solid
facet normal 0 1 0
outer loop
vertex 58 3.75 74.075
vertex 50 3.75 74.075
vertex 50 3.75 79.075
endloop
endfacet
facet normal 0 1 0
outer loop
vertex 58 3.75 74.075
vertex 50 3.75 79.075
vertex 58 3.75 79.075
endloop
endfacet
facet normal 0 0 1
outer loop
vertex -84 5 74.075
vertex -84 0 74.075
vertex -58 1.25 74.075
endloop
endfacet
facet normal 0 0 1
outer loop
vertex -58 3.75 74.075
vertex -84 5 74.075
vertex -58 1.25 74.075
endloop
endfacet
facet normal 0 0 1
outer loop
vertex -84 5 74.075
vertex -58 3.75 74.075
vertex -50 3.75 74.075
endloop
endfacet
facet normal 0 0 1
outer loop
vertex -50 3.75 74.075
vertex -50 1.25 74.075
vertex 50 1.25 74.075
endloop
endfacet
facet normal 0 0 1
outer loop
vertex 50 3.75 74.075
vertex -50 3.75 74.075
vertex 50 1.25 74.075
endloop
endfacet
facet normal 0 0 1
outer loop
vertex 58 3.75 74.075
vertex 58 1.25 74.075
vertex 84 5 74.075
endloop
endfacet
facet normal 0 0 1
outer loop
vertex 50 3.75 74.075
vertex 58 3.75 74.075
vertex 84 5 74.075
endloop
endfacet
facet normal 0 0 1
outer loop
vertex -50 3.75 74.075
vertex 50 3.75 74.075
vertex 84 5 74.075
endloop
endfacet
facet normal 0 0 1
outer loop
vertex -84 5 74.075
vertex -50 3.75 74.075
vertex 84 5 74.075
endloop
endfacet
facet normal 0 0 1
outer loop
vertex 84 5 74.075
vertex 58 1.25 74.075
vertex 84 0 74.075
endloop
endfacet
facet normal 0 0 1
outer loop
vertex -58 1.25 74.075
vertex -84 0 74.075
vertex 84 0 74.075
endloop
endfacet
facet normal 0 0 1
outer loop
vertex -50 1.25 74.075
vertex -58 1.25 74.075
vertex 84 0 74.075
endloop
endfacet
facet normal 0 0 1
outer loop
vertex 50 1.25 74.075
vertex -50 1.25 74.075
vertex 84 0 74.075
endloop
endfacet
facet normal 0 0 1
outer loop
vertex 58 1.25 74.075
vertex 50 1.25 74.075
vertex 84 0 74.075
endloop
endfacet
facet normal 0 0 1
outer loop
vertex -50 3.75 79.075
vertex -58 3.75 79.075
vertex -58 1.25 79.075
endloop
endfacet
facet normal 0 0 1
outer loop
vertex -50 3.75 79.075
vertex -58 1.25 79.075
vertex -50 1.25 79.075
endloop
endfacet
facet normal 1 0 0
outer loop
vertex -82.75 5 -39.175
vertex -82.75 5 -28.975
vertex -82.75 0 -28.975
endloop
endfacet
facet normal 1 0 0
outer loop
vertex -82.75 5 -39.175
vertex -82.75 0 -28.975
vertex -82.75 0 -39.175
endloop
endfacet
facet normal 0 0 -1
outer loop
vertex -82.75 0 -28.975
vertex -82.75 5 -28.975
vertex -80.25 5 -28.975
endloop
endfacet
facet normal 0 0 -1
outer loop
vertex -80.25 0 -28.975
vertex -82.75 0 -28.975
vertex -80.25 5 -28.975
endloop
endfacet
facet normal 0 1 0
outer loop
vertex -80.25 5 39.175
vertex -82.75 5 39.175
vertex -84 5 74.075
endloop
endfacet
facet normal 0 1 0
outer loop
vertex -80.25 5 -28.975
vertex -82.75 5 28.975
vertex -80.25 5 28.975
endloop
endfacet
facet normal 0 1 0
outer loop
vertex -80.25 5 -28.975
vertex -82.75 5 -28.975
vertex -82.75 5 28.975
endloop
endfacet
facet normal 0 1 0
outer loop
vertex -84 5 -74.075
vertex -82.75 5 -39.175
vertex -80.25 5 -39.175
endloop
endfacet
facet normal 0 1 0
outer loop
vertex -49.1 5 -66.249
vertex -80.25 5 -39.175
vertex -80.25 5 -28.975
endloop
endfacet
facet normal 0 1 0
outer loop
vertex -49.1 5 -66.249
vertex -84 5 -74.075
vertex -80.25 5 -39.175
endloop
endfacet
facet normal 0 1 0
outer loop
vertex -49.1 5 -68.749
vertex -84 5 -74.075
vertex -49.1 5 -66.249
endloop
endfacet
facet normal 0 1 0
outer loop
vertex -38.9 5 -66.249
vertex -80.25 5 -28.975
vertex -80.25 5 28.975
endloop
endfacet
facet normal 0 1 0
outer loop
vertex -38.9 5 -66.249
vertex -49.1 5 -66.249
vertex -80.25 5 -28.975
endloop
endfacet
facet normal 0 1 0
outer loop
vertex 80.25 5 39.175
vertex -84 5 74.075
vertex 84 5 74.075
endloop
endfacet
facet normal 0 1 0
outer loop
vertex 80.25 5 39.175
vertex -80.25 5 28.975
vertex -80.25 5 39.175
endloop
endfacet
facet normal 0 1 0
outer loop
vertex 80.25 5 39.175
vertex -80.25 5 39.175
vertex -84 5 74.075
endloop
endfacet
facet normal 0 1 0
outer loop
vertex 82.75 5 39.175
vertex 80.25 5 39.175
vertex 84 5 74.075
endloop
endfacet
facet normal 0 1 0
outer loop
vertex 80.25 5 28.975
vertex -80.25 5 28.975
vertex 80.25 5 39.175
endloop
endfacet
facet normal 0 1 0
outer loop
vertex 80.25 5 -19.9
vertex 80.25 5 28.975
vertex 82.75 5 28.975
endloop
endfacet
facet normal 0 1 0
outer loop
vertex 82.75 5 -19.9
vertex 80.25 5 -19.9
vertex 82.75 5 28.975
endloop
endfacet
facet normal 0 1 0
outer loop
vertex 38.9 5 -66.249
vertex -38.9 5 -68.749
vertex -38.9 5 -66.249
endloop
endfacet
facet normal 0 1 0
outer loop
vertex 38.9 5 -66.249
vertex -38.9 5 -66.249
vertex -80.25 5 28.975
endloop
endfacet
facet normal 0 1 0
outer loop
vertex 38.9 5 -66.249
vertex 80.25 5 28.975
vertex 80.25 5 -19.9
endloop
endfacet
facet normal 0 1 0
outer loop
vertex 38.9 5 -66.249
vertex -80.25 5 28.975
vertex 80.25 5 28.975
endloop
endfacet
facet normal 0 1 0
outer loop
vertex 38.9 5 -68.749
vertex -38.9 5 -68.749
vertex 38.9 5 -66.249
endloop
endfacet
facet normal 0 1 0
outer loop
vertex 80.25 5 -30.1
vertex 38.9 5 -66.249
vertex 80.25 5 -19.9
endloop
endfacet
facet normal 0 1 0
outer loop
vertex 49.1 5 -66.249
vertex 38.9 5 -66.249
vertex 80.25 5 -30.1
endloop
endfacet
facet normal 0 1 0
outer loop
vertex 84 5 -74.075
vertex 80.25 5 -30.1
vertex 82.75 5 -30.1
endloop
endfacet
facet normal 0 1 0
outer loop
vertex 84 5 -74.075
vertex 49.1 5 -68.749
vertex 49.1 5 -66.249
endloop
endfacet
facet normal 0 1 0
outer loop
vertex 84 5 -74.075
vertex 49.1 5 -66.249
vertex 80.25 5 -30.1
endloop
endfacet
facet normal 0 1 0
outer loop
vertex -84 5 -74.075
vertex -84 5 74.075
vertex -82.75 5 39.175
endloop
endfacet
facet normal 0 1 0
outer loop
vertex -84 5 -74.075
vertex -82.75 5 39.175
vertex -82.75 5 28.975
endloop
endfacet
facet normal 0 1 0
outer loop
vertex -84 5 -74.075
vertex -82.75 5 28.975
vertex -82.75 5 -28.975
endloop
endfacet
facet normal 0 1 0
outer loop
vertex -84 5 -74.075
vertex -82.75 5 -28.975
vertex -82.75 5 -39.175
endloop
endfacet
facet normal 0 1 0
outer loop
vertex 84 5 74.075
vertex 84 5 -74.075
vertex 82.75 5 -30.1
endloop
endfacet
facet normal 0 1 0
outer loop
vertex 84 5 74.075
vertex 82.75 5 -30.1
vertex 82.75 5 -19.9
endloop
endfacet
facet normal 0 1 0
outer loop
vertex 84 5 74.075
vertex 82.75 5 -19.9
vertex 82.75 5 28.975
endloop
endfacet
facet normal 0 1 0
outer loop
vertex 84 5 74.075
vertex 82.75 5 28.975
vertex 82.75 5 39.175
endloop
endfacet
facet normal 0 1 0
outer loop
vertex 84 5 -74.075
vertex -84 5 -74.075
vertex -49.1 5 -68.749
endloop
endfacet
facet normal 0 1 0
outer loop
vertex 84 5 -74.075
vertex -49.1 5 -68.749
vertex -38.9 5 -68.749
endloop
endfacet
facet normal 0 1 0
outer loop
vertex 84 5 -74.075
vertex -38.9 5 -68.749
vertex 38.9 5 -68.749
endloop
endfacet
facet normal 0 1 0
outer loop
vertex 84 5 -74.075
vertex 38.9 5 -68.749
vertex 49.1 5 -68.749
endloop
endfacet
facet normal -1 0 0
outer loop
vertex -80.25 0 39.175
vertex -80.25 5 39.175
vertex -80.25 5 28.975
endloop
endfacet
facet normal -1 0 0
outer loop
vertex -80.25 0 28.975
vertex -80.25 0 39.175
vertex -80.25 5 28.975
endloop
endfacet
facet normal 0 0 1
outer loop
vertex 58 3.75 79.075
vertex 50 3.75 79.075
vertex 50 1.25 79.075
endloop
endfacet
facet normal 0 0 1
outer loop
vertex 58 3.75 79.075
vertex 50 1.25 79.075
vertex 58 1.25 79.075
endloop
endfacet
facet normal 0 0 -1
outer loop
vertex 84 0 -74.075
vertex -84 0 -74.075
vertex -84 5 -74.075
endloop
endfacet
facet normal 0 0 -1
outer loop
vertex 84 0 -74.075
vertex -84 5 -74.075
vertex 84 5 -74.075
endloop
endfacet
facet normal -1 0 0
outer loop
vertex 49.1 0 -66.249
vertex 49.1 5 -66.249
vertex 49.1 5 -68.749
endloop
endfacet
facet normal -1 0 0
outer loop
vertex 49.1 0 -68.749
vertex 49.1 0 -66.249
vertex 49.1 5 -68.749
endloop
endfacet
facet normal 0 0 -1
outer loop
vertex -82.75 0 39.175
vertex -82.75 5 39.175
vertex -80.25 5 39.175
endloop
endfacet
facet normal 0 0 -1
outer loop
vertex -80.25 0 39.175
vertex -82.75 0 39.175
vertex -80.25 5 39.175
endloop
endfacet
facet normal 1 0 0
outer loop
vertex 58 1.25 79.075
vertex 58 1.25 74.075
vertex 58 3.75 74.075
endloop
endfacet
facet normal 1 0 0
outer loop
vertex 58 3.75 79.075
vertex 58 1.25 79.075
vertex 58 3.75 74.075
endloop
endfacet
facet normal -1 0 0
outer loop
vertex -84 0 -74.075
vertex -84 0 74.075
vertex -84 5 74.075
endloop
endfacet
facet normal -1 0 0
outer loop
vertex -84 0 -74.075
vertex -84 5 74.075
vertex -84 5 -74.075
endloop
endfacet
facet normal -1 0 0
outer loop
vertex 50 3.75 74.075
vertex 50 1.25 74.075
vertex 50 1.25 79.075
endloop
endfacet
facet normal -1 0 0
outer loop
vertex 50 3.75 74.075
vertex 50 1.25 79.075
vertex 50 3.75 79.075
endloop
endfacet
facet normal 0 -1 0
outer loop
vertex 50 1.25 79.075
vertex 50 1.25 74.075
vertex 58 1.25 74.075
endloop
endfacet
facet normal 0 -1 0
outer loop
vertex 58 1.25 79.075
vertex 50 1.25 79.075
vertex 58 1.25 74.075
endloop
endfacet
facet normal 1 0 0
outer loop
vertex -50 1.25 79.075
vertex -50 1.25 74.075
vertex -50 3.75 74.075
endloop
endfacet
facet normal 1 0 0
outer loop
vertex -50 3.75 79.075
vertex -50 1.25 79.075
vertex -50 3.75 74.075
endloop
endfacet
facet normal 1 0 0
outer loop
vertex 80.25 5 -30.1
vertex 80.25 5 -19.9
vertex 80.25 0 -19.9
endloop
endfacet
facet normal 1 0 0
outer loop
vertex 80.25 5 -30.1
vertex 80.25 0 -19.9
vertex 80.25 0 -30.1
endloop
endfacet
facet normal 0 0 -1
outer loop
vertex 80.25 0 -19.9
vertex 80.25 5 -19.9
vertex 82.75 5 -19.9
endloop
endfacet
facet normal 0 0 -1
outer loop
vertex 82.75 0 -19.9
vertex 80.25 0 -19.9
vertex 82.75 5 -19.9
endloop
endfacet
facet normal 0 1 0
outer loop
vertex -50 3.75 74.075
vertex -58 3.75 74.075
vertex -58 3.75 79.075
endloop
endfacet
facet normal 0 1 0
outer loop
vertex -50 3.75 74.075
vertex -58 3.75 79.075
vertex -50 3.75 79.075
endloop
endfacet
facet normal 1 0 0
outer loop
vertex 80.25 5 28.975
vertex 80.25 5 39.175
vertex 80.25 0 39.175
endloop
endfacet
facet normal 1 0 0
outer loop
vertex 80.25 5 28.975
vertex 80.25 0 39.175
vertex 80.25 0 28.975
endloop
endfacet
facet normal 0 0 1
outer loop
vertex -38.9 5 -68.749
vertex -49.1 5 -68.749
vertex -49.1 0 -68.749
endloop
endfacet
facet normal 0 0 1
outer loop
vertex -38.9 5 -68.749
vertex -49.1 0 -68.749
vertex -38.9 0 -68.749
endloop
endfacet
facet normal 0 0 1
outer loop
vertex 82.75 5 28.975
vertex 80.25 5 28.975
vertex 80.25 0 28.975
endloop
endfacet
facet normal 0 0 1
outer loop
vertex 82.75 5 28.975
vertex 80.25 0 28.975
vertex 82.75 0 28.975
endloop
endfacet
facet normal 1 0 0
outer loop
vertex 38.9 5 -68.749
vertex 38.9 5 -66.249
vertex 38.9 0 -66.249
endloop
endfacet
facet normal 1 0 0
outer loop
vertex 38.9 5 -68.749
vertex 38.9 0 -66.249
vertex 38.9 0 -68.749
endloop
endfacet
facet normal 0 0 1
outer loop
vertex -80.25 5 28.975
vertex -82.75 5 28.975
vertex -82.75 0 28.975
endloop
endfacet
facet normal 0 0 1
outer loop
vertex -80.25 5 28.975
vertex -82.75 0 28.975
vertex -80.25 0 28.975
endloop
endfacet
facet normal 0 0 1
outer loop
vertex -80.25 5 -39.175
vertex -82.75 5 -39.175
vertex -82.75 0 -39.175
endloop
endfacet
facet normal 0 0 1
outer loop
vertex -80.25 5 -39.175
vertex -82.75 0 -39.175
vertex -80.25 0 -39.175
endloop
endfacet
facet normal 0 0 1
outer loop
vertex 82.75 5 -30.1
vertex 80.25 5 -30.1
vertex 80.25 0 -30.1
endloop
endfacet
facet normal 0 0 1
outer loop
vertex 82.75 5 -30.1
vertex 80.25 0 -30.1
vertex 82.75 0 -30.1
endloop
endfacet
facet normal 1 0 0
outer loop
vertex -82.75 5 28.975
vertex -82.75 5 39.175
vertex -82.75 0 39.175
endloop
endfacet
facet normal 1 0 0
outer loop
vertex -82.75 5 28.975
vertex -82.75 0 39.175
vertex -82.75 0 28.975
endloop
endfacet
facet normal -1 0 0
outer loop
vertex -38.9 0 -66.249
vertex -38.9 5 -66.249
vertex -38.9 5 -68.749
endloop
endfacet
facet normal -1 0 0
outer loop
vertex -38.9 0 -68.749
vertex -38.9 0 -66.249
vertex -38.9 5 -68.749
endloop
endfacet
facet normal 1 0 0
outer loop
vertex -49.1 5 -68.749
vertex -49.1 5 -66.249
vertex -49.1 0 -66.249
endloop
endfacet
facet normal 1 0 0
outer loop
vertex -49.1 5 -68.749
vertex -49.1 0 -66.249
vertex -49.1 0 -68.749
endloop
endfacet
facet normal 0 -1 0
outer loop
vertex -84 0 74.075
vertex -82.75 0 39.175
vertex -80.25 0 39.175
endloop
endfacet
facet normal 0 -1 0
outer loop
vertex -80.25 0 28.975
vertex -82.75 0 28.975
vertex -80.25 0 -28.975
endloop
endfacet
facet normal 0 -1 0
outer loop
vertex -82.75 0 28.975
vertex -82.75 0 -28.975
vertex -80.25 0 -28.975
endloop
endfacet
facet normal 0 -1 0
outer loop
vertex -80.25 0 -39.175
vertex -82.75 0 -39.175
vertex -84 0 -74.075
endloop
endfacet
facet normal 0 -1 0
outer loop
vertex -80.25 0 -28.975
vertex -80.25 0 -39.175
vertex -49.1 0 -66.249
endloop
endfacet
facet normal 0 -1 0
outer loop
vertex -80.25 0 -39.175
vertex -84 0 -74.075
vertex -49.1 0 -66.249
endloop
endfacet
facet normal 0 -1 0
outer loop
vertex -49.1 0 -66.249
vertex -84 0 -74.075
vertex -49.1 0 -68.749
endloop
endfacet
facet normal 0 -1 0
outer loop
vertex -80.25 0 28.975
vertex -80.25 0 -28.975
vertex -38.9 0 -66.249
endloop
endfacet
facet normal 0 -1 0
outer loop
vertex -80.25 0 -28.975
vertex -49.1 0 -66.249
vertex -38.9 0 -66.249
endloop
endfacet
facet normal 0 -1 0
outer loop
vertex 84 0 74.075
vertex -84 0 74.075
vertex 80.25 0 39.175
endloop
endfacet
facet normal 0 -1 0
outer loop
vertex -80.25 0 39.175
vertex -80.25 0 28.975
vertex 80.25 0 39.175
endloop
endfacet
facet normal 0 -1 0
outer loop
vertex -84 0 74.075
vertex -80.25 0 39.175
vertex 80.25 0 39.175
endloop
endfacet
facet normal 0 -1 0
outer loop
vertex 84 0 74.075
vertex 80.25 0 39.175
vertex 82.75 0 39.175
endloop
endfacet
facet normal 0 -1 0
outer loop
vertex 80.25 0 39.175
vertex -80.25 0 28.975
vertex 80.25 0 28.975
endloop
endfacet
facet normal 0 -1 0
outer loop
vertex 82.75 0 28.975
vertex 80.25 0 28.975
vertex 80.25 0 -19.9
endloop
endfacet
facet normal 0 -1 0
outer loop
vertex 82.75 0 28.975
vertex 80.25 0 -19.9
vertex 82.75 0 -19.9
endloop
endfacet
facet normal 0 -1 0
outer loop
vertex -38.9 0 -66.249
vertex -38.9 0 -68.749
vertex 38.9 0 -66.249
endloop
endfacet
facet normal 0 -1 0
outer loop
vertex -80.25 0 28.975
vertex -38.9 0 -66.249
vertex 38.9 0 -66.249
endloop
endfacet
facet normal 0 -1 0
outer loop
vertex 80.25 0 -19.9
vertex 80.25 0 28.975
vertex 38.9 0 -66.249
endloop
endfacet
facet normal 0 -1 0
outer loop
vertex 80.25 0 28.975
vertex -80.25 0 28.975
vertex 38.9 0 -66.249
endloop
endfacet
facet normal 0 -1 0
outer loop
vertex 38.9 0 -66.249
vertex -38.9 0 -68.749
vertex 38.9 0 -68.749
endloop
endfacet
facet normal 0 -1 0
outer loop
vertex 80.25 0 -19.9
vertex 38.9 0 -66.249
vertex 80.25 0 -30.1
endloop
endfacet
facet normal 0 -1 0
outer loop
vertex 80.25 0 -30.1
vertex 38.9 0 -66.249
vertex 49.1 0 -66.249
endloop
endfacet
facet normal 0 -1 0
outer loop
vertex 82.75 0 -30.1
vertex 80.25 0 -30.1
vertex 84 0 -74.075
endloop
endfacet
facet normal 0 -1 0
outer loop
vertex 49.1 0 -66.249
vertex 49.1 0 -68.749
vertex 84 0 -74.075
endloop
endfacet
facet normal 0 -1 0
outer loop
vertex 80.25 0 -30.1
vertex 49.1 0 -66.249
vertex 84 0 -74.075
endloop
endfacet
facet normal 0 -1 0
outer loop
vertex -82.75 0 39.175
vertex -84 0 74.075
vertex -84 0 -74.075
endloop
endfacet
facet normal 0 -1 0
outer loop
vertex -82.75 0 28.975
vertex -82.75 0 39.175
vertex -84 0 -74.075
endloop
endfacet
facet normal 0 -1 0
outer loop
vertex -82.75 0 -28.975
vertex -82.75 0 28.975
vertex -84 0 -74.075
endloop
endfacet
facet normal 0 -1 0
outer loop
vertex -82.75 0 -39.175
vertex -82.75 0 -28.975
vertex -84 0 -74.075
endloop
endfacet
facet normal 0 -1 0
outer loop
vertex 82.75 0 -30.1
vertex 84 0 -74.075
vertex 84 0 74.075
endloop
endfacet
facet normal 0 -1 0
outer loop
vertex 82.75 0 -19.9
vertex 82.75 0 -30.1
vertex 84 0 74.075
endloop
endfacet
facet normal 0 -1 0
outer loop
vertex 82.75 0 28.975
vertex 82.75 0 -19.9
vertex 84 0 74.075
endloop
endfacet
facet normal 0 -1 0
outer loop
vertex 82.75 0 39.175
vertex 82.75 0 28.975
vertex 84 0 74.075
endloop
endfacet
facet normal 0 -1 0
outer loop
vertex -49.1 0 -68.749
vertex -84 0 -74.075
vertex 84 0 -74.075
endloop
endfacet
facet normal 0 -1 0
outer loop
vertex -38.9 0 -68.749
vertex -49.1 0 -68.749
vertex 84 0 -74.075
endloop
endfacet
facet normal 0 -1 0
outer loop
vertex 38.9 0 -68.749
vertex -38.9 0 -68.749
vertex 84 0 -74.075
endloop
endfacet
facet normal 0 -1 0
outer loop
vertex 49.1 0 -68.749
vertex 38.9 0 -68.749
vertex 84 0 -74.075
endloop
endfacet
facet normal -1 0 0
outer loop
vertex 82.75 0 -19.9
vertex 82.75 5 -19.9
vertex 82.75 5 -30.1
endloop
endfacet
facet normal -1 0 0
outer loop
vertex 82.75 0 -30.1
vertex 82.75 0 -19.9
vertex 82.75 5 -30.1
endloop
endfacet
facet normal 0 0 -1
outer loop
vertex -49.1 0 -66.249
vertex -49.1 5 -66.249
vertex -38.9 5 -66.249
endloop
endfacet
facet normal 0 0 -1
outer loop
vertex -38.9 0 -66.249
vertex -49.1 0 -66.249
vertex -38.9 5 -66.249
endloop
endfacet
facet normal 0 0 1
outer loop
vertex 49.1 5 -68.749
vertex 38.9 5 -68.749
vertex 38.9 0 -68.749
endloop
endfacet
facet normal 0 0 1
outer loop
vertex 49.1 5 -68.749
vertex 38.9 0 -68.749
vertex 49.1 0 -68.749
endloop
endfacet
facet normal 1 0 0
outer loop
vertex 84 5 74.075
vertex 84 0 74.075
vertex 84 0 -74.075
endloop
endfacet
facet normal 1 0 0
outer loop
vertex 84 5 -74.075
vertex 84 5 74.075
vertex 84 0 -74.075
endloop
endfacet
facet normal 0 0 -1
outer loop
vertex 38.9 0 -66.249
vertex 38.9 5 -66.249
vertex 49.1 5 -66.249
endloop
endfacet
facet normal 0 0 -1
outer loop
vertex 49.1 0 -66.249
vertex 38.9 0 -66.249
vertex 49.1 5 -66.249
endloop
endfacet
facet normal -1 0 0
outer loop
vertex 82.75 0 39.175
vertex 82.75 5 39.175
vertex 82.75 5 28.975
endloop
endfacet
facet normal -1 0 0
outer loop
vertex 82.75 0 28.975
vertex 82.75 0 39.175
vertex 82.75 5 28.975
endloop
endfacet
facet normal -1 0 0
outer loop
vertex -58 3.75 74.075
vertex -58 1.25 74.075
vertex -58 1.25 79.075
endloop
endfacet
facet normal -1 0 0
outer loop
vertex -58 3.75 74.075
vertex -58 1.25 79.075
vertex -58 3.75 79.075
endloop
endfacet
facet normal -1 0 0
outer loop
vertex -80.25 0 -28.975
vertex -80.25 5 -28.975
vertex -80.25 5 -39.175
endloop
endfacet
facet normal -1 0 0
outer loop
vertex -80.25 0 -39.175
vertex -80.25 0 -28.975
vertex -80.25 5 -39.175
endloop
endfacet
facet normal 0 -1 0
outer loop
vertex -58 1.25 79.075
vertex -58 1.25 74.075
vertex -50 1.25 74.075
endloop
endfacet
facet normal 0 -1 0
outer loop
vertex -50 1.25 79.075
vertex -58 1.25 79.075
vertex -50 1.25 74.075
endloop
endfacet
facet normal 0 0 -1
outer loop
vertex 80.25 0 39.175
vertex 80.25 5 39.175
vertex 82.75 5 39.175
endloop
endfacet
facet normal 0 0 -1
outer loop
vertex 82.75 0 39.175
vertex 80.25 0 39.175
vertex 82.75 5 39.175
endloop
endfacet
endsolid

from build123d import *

# Parameters (mm, degrees)
CROQUIS1_W              = 168
CROQUIS1_H              = 148.15
SALIENTE_EXTRUIR1_DEPTH = 5
CROQUIS2_W              = 2.5
CROQUIS2_H              = 10.2
CORTAR_EXTRUIR1_DEPTH   = 5
CROQUIS4_W              = 8
CROQUIS4_H              = 2.5
SALIENTE_EXTRUIR2_DEPTH = 5
SKETCH1_W               = 10.2
SKETCH1_H               = 2.5
CUT_EXTRUDE2_DEPTH      = 5


with BuildPart() as part:
    # Croquis1 → Saliente-Extruir1 (new body)
    with BuildSketch(Plane(origin=(0, 0, 0), x_dir=(1, 0, 0), z_dir=(0, 1, 0))):
        Rectangle(CROQUIS1_W, CROQUIS1_H)
    extrude(amount=SALIENTE_EXTRUIR1_DEPTH)

    # Croquis2 → Cortar-Extruir1 (cut)
    with BuildSketch(Plane(origin=(0, 5, 0), x_dir=(1, 0, 0), z_dir=(0, 1, 0))):
        with Locations((-81.5, 34.075)):
            Rectangle(CROQUIS2_W, CROQUIS2_H)
        with Locations((-81.5, -34.075)):
            Rectangle(CROQUIS2_W, CROQUIS2_H)
        with Locations((81.5, -34.075)):
            Rectangle(CROQUIS2_W, CROQUIS2_H)
        with Locations((81.5, 25)):
            Rectangle(CROQUIS2_W, CROQUIS2_H)
    extrude(amount=-CORTAR_EXTRUIR1_DEPTH, mode=Mode.SUBTRACT)

    # Croquis4 → Saliente-Extruir2 (add)
    with BuildSketch(Plane.XY.offset(74.075)):
        with Locations((-54, 2.5)):
            Rectangle(CROQUIS4_W, CROQUIS4_H)
        with Locations((54, 2.5)):
            Rectangle(CROQUIS4_W, CROQUIS4_H)
    extrude(amount=SALIENTE_EXTRUIR2_DEPTH)

    # Sketch1 → Cut-Extrude2 (cut)
    with BuildSketch(Plane(origin=(0, 5, 0), x_dir=(1, 0, 0), z_dir=(0, 1, 0))):
        with Locations((-44, 67.49891)):
            Rectangle(SKETCH1_W, SKETCH1_H)
        with Locations((44, 67.49891)):
            Rectangle(SKETCH1_W, SKETCH1_H)
    extrude(amount=-CUT_EXTRUDE2_DEPTH, mode=Mode.SUBTRACT)


solid = part.part
